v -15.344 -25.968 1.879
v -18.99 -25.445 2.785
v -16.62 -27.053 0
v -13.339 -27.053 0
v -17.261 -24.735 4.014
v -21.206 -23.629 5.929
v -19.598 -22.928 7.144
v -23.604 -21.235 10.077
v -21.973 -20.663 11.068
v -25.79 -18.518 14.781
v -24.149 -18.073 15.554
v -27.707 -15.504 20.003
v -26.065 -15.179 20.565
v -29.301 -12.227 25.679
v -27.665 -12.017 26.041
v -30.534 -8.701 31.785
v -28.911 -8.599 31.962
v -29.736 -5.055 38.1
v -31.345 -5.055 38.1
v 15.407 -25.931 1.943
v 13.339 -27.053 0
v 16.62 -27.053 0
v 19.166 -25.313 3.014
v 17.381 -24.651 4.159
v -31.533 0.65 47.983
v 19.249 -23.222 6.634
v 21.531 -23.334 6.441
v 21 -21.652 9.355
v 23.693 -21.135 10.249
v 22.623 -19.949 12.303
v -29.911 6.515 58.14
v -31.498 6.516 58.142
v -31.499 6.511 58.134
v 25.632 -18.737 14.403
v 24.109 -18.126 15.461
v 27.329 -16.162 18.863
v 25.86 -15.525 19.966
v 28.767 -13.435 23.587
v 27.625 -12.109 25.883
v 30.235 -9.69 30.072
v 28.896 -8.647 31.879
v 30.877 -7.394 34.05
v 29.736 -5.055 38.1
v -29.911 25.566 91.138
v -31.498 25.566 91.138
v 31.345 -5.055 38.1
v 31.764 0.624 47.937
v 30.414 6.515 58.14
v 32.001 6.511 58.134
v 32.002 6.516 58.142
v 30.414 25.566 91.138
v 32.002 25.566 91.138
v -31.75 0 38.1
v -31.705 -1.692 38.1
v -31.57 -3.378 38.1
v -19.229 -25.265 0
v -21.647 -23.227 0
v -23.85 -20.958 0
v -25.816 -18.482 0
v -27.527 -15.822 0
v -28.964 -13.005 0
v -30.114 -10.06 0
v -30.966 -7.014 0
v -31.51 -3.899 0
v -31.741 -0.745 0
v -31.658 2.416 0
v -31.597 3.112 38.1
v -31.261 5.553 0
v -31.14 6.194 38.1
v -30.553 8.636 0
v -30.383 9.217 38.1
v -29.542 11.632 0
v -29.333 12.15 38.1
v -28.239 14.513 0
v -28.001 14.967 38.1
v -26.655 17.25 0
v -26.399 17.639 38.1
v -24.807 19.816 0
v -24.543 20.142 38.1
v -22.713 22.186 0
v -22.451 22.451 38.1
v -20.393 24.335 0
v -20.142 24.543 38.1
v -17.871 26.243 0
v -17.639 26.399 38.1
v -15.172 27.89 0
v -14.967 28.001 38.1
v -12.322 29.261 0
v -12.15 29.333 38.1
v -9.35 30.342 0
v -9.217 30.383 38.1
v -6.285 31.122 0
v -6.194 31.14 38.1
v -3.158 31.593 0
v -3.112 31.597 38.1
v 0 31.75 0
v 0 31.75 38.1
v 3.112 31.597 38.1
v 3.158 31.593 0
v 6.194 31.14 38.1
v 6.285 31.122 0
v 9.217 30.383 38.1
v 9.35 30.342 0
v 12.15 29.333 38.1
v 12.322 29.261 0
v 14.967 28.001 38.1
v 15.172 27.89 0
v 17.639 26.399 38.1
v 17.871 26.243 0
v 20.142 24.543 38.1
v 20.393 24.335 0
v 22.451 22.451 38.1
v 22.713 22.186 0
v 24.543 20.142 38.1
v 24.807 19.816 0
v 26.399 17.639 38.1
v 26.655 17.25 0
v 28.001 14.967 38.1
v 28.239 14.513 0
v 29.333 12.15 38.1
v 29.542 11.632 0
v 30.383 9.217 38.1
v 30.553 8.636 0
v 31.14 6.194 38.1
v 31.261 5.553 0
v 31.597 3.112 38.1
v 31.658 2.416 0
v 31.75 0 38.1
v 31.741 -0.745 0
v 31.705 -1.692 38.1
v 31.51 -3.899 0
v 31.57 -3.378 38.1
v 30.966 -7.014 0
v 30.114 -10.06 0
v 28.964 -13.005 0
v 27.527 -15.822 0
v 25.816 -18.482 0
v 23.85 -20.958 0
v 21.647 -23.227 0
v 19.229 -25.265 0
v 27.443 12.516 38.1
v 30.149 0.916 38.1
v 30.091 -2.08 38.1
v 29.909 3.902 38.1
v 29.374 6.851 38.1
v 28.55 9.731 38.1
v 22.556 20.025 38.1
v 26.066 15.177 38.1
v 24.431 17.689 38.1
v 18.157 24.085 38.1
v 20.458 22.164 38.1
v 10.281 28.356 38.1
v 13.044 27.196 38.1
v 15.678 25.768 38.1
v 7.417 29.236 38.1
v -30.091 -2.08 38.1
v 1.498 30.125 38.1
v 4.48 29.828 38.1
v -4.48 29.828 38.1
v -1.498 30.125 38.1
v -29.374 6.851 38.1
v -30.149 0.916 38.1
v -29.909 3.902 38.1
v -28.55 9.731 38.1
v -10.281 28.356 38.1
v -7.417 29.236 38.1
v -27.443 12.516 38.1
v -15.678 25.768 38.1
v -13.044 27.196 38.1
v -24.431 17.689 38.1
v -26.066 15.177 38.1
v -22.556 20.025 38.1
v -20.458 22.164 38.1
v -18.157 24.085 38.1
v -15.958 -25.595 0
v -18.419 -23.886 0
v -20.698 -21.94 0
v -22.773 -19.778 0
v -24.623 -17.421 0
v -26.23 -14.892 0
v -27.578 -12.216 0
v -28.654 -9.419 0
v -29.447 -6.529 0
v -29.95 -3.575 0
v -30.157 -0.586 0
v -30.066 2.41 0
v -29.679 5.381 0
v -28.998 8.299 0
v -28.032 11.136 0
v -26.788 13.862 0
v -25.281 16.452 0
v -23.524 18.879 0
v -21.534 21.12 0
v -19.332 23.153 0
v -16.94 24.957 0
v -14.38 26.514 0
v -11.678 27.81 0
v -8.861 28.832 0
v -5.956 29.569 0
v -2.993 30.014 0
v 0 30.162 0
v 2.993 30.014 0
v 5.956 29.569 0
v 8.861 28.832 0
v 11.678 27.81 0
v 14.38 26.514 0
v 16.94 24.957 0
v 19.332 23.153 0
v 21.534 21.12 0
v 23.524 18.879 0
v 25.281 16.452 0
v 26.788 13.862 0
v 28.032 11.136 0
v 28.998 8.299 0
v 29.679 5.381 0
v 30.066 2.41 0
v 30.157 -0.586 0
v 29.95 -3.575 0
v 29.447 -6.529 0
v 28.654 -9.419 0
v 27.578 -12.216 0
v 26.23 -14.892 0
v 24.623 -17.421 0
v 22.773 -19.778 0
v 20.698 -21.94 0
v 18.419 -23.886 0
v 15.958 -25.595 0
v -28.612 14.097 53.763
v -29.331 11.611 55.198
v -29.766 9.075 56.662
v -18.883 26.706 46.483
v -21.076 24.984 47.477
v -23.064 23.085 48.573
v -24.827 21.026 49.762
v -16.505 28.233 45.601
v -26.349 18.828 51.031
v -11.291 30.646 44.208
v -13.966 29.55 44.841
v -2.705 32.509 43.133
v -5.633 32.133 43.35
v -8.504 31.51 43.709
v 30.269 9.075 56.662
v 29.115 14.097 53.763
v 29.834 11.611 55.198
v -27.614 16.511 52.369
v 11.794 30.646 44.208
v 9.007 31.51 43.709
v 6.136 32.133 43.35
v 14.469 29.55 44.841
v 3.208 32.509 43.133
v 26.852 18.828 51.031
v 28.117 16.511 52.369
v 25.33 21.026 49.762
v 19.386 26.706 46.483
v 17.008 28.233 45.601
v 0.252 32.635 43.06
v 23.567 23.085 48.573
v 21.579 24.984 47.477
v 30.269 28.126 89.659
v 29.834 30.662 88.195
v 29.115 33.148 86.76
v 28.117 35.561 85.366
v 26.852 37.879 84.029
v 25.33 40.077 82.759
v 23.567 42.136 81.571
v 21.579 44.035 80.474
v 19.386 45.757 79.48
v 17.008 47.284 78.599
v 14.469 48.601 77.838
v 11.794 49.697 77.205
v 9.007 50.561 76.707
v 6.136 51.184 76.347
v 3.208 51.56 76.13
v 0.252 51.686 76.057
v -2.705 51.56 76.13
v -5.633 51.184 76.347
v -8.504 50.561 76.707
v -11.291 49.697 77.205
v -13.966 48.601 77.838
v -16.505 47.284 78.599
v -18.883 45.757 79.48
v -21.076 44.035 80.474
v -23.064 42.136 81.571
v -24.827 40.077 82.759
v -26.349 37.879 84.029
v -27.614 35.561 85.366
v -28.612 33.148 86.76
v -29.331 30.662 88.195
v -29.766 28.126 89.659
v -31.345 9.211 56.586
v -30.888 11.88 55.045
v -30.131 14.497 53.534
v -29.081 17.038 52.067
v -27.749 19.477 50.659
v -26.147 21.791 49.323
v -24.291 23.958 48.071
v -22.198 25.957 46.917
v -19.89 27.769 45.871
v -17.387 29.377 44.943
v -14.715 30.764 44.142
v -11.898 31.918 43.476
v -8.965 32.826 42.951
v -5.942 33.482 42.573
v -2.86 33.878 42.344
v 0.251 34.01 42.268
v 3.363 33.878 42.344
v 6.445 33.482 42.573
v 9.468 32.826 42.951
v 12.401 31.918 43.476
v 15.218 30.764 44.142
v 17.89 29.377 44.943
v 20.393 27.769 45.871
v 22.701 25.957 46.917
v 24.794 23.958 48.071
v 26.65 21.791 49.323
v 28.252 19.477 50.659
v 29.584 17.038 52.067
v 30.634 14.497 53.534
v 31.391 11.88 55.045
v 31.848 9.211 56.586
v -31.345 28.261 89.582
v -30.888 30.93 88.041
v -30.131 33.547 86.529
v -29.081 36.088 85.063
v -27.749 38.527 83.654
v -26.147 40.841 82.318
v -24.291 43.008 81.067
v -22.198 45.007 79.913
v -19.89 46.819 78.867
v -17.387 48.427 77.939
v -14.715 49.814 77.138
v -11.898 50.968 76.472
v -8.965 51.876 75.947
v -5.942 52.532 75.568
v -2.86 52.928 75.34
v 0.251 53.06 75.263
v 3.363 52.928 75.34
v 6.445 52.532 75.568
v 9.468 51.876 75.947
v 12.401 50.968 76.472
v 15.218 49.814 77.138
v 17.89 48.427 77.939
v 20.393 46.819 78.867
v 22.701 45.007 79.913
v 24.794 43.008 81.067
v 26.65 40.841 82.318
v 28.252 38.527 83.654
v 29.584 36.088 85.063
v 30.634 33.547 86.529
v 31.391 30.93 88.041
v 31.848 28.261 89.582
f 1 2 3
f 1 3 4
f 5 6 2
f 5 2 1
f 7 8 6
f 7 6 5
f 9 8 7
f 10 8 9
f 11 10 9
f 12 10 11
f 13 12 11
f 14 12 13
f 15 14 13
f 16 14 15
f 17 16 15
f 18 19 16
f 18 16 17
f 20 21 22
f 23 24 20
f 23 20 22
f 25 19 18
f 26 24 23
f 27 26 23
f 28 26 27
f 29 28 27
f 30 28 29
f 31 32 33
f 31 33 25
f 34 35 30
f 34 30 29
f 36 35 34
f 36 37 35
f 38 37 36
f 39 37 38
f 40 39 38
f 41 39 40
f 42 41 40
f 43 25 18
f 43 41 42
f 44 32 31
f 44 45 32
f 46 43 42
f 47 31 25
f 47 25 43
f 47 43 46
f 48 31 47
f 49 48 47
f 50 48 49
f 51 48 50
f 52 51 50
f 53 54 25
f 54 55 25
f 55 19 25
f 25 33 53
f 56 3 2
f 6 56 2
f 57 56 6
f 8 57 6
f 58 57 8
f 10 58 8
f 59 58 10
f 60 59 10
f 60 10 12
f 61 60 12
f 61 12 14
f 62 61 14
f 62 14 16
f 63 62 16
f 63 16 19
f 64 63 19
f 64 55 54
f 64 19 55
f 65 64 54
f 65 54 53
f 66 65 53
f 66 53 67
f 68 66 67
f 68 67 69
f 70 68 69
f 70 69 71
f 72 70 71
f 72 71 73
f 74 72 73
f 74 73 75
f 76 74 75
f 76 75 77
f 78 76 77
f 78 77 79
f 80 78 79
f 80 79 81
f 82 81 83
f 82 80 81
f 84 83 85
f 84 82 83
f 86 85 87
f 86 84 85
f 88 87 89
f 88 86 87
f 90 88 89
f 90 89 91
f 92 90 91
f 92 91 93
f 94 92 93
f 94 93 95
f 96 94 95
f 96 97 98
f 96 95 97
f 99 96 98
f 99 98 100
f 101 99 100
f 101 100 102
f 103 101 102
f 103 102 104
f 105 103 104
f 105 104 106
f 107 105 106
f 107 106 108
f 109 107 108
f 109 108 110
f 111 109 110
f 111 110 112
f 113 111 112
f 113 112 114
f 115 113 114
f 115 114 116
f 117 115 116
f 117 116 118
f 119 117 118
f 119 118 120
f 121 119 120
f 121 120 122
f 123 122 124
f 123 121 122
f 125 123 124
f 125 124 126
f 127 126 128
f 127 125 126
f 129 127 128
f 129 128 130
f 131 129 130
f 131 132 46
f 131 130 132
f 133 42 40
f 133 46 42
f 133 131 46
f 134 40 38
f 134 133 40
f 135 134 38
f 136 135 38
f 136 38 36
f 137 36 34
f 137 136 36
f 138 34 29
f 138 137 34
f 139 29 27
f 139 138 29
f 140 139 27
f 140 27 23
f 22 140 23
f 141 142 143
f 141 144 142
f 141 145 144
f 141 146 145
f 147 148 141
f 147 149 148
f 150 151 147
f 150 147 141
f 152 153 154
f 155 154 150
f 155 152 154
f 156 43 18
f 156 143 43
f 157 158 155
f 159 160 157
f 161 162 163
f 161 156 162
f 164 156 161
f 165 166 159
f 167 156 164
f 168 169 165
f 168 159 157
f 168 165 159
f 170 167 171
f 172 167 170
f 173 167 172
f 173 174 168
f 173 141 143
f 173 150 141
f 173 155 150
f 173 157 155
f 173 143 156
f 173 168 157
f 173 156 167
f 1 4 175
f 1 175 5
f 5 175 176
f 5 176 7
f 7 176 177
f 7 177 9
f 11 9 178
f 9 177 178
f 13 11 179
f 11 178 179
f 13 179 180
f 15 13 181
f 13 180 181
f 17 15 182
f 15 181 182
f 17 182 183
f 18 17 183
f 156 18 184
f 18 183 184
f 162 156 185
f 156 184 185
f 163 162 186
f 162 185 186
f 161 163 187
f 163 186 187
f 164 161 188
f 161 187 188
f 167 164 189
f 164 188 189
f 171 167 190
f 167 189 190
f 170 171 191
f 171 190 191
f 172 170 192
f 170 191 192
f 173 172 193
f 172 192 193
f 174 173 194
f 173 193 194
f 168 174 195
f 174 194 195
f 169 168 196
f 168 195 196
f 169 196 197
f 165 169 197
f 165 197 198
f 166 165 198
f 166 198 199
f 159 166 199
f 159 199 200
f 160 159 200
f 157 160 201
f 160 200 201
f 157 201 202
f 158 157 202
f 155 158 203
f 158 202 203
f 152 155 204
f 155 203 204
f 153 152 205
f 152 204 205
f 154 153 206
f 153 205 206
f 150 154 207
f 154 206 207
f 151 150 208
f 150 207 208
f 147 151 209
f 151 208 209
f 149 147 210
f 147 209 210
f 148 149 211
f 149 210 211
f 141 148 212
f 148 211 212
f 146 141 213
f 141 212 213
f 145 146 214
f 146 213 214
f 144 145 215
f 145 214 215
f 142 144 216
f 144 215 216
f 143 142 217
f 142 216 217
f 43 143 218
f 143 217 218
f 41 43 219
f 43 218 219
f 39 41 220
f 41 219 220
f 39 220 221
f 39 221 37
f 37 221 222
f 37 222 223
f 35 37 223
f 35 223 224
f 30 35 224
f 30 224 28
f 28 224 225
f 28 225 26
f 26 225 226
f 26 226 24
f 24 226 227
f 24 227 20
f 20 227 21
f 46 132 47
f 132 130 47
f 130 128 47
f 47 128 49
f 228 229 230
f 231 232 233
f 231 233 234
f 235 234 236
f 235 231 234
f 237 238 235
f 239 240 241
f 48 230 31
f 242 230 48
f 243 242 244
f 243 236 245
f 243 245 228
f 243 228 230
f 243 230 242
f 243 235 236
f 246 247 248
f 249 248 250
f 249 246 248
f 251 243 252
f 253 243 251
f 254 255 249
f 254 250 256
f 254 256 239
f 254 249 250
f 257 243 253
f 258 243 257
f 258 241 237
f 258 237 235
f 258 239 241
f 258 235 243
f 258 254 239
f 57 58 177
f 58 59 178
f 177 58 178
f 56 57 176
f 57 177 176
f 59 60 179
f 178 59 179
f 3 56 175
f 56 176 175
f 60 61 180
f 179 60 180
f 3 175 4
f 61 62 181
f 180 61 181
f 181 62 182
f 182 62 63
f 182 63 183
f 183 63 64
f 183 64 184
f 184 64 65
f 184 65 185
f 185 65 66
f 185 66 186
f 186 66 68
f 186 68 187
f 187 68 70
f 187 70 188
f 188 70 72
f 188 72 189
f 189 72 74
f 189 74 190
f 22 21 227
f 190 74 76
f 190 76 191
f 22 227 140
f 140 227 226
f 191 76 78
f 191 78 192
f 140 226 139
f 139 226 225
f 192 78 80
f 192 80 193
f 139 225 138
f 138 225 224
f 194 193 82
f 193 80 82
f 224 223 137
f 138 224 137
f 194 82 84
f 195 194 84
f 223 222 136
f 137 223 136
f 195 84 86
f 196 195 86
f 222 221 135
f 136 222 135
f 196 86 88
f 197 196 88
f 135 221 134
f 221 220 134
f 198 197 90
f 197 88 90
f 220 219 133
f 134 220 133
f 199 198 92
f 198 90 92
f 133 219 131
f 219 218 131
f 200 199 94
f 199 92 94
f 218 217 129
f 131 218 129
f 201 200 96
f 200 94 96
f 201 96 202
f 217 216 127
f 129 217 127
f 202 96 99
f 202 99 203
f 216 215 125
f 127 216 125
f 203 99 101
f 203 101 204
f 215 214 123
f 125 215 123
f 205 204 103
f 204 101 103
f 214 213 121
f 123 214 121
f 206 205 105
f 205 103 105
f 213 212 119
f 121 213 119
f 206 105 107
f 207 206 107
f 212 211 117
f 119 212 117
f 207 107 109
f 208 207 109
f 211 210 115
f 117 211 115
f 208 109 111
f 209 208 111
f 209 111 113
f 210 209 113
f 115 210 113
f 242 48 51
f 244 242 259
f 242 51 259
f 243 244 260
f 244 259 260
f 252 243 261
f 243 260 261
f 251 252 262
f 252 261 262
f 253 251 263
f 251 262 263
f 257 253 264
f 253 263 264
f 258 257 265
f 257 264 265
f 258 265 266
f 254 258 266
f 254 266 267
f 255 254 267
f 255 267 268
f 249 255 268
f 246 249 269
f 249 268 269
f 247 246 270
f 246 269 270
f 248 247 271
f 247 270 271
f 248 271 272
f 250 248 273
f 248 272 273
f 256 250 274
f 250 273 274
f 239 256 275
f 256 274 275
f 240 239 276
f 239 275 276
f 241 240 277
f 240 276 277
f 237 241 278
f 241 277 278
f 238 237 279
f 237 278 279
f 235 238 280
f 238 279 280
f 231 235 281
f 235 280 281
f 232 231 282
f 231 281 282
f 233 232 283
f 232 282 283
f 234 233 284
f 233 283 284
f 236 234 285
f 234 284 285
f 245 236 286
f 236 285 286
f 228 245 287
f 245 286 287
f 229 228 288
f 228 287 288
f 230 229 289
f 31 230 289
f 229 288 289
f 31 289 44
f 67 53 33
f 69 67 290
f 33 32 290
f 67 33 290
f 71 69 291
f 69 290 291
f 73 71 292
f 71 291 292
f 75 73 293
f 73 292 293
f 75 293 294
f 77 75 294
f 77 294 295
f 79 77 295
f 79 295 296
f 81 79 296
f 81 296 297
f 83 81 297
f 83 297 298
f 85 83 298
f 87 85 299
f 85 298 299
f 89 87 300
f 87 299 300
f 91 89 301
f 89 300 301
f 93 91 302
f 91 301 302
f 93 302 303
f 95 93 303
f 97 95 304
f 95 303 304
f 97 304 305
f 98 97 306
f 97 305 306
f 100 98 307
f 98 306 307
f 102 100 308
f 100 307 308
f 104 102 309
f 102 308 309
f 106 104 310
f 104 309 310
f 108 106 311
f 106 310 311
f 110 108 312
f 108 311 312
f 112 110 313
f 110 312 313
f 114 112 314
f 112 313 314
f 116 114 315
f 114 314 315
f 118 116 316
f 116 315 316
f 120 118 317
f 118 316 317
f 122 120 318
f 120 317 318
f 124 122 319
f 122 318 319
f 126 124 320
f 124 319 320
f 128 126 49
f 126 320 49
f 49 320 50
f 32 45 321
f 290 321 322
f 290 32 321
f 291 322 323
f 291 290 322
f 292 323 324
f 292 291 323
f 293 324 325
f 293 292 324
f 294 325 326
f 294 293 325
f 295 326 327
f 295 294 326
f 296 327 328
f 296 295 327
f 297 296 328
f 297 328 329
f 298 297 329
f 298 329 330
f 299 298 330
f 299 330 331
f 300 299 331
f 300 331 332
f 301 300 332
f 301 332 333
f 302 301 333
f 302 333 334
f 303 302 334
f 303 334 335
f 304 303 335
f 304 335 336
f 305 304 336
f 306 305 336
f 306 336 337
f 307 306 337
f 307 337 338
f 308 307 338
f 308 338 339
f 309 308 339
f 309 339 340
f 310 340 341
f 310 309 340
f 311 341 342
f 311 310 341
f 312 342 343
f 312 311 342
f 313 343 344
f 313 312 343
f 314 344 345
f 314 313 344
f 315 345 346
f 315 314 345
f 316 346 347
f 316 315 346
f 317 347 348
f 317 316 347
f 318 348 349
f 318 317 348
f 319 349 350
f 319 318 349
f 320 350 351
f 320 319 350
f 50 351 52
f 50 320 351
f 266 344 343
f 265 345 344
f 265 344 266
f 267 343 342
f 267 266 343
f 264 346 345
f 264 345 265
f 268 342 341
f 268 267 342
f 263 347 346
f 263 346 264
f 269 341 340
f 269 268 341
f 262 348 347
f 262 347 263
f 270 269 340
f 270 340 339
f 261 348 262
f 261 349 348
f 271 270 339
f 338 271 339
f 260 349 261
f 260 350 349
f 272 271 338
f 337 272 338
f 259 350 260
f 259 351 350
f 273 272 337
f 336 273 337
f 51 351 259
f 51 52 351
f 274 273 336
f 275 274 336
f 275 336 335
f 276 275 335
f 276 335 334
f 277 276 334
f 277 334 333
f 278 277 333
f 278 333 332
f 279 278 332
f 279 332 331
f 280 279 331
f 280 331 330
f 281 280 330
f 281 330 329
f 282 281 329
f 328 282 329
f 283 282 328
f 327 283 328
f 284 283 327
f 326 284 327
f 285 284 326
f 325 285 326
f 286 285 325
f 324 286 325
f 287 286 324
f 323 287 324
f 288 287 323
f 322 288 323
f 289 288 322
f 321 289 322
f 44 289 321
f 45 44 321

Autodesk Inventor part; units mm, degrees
ref_plane "YZ Plane" through (0, 0, 0) normal (1, 0, 0) x (0, 1, 0)
sketch "Sketch1" plane through (0, 0, 0) normal (0, 0, 1) x (1, 0, 0)
  circle A0 centre (0, 0) radius 31.75
  dimension "d0" = 63.5
extrude "Extrusion1" add sketch "Sketch1" along normal blind 38.1
sketch "Sketch2" plane through (0, 0, 38.1) normal (0, 0, 1) x (1, 0, 0)
  circle A0 centre (0, 0) radius 31.75 projected
  point P0 (0, 31.75)
ref_plane "Work Plane1" through (0, 31.75, 38.1) normal (0, 1, 0) x (-1, 0, 0)
sketch "Sketch3" plane through (0, 31.75, 38.1) normal (0, 1, 0) x (-1, 0, 0)
  line L0 (-11.7088, 2.54) -> (14.1872, 2.54) construction
  line L1 (31.75, 0) -> (-31.75, 0) projected
  point P0 (0, -38.1)
  dimension "d3" = 2.54
ref_plane "Work Plane3" through (11.7088, 33.02, 42.8397) normal (0, 0.5, 0.8660254) x (-1, 0, 0)
ref_plane "Work Plane2" through (11.7088, 31.75, 40.64) normal (0, 0.5, 0.8660254) x (-1, 0, 0)
sketch "Sketch5" plane through (11.7088, 33.02, 42.8397) normal (0, 0.5, 0.8660254) x (-1, 0, 0)
  circle A0 centre (11.4573, 30.6064) radius 31.75
  line L0 (0.2164, -1.1436) -> (24.8554, -1.1436) construction
  point P0 (11.7088, 7.1763)
  dimension "d15" = 63.5
  dimension "d16" = 31.75
extrude "Extrusion3" add sketch "Sketch5" along normal blind 38.1
loft "Loft1" add section 1 edges at (-31.75, 0, 38.1) section 2 edges at (32.0015, 6.5141, 58.1429)
sketch "Sketch6" plane through (0, 0, 0) normal (0, 0, -1) x (-1, 0, 0)
  circle A0 centre (0, 0) radius 31.75 projected
  circle A1 centre (0, 0) radius 30.1625
  dimension "d23" = 60.325
extrude "Extrusion4" cut sketch "Sketch6" against normal blind 38.1 contours A1
sketch "Sketch7" plane through (0.2515, 25.5641, 91.1385) normal (0, 0.5, 0.8660254) x (1, 0, 0)
  circle A0 centre (0, 0) radius 31.75 projected
  circle A1 centre (0, 0) radius 30.1625
  point P0 (-0.2515, 23.4301)
  dimension "d26" = 60.325
extrude "Extrusion5" cut sketch "Sketch7" against normal blind 38.1 contours A1
sketch "Sketch8" plane through (0.2515, 25.5641, 91.1385) normal (0, 0.5, 0.8660254) x (1, 0, 0)
  circle A0 centre (0, 0) radius 30.1625 projected
  circle A1 centre (0, 0) radius 31.75 projected
  point P0 (-0.2515, 23.4301)
  point P1 (0, -31.75)
ref_plane "Work Plane4" through (0.2515, -1.9323, 107.0135) normal (0, -0.8660254, 0.5) x (1, 0, 0)
sketch "Sketch9" plane through (0.2515, -1.9323, 107.0135) normal (0, -0.8660254, 0.5) x (1, 0, 0)
  line L0 (-48.3779, -109.4634) -> (50.7956, -109.4634)
  line L1 (50.7956, -109.4634) -> (50.7956, 8.7454)
  line L2 (50.7956, 8.7454) -> (-48.3779, 8.7454)
  line L3 (-48.3779, 8.7454) -> (-48.3779, -109.4634)
  point P0 (-0.2515, -91.7103)
extrude "cut" cut sketch "Sketch9" against normal blind 31.75
properties part number "sup-angled" material "PVC-Piping"
